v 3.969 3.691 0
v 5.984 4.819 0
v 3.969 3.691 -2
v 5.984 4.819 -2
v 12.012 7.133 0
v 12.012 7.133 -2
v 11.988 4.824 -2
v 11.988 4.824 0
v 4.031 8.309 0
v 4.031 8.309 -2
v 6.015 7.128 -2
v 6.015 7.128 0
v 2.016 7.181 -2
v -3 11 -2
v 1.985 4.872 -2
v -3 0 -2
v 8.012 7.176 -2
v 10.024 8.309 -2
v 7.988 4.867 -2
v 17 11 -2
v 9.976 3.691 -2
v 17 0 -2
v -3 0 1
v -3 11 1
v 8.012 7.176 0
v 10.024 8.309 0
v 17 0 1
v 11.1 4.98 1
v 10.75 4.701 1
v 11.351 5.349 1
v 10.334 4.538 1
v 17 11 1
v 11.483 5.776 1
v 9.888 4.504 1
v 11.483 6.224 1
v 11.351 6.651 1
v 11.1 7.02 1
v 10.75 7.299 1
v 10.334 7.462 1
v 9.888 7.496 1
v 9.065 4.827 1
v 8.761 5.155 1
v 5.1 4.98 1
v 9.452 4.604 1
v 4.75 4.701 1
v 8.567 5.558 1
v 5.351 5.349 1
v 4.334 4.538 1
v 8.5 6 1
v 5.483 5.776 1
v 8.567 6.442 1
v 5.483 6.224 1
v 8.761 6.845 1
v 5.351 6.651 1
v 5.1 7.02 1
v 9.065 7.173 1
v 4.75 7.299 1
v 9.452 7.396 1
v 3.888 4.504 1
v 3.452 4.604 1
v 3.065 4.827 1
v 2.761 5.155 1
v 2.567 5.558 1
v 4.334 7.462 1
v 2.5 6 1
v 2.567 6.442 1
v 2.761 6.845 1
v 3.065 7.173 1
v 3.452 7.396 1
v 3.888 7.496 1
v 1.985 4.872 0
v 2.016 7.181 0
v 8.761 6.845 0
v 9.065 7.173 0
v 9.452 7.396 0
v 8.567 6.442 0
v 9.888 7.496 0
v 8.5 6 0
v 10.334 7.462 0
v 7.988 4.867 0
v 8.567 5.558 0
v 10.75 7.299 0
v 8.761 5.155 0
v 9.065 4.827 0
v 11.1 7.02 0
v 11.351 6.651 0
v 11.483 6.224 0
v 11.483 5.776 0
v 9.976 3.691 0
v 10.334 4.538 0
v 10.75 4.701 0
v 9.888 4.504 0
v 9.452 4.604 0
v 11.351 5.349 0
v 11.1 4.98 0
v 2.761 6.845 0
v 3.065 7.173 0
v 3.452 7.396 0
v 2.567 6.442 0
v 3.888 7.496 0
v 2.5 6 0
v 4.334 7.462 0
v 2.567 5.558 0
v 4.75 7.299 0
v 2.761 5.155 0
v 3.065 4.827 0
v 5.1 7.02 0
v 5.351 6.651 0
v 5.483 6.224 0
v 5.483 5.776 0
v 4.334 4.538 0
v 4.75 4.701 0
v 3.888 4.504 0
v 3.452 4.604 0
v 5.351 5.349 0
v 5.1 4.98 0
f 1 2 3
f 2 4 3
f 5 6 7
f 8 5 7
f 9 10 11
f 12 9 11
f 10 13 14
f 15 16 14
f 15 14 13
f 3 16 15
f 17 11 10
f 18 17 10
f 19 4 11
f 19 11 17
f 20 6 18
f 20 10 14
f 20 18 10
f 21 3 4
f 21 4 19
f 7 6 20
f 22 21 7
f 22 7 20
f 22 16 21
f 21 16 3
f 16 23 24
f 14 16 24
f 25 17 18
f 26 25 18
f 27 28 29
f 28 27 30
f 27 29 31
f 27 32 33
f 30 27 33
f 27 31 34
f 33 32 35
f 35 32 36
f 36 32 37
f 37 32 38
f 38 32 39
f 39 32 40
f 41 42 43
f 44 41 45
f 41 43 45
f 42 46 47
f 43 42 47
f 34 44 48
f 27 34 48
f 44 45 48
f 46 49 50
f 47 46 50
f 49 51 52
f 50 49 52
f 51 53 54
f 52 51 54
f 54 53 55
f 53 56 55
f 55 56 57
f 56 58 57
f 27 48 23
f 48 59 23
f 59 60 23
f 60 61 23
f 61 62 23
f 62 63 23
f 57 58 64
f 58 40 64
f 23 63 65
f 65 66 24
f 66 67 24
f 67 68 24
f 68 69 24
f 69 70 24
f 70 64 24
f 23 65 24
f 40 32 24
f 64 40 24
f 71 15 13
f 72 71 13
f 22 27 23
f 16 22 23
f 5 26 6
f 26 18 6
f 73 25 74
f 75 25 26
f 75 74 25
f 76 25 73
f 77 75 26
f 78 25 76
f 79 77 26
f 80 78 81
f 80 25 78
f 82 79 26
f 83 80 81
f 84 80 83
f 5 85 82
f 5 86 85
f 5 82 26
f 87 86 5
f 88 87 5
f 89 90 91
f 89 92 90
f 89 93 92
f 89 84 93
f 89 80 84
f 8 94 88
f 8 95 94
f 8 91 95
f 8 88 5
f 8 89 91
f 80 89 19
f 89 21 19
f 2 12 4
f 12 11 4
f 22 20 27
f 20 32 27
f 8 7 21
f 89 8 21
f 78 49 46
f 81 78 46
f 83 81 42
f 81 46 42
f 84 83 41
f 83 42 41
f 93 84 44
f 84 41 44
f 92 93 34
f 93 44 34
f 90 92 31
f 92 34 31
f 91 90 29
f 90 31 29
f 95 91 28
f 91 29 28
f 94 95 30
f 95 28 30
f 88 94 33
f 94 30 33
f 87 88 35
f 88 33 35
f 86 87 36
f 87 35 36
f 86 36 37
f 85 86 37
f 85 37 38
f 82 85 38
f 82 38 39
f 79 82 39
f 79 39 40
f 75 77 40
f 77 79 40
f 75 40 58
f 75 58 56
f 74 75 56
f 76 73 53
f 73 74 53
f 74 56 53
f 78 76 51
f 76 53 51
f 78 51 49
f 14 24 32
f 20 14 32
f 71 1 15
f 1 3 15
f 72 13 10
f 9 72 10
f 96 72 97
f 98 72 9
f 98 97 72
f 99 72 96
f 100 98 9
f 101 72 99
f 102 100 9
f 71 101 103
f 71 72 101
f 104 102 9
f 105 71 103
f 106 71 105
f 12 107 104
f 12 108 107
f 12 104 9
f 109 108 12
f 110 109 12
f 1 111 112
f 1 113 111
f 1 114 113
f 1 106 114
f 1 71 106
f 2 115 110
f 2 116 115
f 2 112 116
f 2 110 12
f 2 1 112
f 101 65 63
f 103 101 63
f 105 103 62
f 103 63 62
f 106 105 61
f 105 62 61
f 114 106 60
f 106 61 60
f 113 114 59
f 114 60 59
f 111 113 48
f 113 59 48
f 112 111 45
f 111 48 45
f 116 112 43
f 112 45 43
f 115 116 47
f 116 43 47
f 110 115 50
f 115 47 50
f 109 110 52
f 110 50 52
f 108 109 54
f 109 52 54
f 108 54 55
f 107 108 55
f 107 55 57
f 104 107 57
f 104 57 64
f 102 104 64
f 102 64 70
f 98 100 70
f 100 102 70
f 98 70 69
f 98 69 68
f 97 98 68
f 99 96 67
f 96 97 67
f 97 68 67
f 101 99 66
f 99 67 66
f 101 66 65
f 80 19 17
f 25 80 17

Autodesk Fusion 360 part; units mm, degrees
sketch "Sketch1" plane through (0, 0, 0) normal (0, 0, 1) x (1, 0, 0)
  line L0 (0, 0) -> (14, 0)
  line L1 (14, 0) -> (14, 11)
  line L2 (14, 11) -> (0, 11)
  line L3 (0, 11) -> (0, 0)
  dimension "d1" = 14
  dimension "d2" = 11
extrude "Extrude1" add sketch "Sketch1" along normal blind 2
sketch "Sketch2" plane through (0, 0, 0) normal (0, -1, 0) x (1, 0, 0)
  line L0 (0, 0) -> (14, 0)
  line L1 (14, 0) -> (14, 2)
  line L2 (14, 2) -> (0, 2)
  line L3 (0, 2) -> (0, 0)
sketch "Sketch3" plane through (0, 0, 2) normal (0, 0, 1) x (-1, 0, 0)
  line L0 (0, -11) -> (0, 0)
  line L1 (0, 0) -> (-14, 0)
  line L2 (-14, 0) -> (-14, -11)
  line L3 (-14, -11) -> (0, -11)
  line L4 (0, -11) -> (3, -11)
  line L5 (3, -11) -> (3, 0)
  line L6 (3, 0) -> (0, 0)
  line L7 (0, 0) -> (0, -11)
  line L8 (-14, -11) -> (-17, -11)
  line L9 (-17, -11) -> (-17, 0)
  line L10 (-17, 0) -> (-14, 0)
  line L11 (-14, 0) -> (-14, -11)
  dimension "d26" = 3
  dimension "d27" = 3
extrude "Extrude2" add sketch "Sketch3" along normal blind 7 and the other way blind 2 contours L0 L4 L5 L6 L7 | L2 L8 L9 L10 L11
sketch "Sketch4" plane through (0, 0, 0) normal (0, 0, -1) x (1, 0, 0)
  line L0 (-3, -11) -> (17, -11)
  line L1 (17, -11) -> (17, 0)
  line L2 (17, 0) -> (-3, 0)
  line L3 (-3, 0) -> (-3, -11)
  line L4 (-3, 0) -> (17, 0)
  line L5 (17, 0) -> (17, -11)
  line L6 (17, -11) -> (-3, -11)
  line L7 (-3, -11) -> (-3, 0)
extrude "Extrude3" add sketch "Sketch4" along normal blind 2
sketch "Sketch5" plane through (0, 0, 2) normal (0, 0, 1) x (-1, 0, 0)
  line L0 (0, -11) -> (0, 0)
  line L1 (0, 0) -> (-14, 0)
  line L2 (-14, 0) -> (-14, -11)
  line L3 (-14, -11) -> (0, -11)
  line L4 (-7, -11) -> (-7, -6)
  line L5 (-7, -6) -> (0, -6)
  line L6 (-7, -6) -> (-14, -6)
  circle A0 centre (-4, -6) radius 1.5
  circle A1 centre (-10, -6) radius 1.5
  dimension "d11" = 5
  dimension "d12" = 3
  dimension "d13" = 3
  dimension "d31" = 6
  dimension "d32" = 4
extrude "Extrude4" cut sketch "Sketch5" against normal blind 4 contours L5 A0 | L5 A0 | L6 A1 | L6 A1
sketch "Sketch7" plane through (0, 0, -2) normal (0, 0, -1) x (1, 0, 0)
  circle A0 centre (4, -6) radius 1.5
  circle A1 centre (10, -6) radius 1.5
  line L0 (-3, -11) -> (17, -11)
  line L1 (17, -11) -> (17, 0)
  line L2 (17, 0) -> (-3, 0)
  line L3 (-3, 0) -> (-3, -11)
  line L4 (11.9876, -4.8242) -> (9.9755, -3.6907)
  line L5 (9.9755, -3.6907) -> (7.9879, -4.8666)
  line L6 (7.9879, -4.8666) -> (8.0124, -7.1758)
  line L7 (8.0124, -7.1758) -> (10.0245, -8.3093)
  line L8 (10.0245, -8.3093) -> (12.0121, -7.1334)
  line L9 (12.0121, -7.1334) -> (11.9876, -4.8242)
  line L10 (2.0156, -7.1814) -> (4.0309, -8.3092)
  line L11 (4.0309, -8.3092) -> (6.0153, -7.1278)
  line L12 (6.0153, -7.1278) -> (5.9844, -4.8186)
  line L13 (5.9844, -4.8186) -> (3.9691, -3.6908)
  line L14 (3.9691, -3.6908) -> (1.9847, -4.8722)
  line L15 (1.9847, -4.8722) -> (2.0156, -7.1814)
  point P0 (10, -6)
  point P1 (4, -6)
  dimension "d22" = 2
  dimension "d23" = 2
extrude "Extrude6" cut sketch "Sketch7" against normal blind 2 contours L4 L5 L6 L7 L8 L9 | L10 L11 L12 L13 L14 L15
fillet "Fillet1" radius 1 4 edges at (-3, 5.5, 9) (0, 5.5, 9) (14, 5.5, 9) (17, 5.5, 9)
sketch "Sketch8" plane through (0, 11, 0) normal (0, 1, 0) x (-1, 0, 0)
  arc A0 (-16, 9) -> (-17, 8) centre (-16, 8) ccw
  line L0 (-17, 8) -> (-17, -2)
  line L1 (-17, -2) -> (3, -2)
  line L2 (3, -2) -> (3, 8)
  arc A1 (3, 8) -> (2, 9) centre (2, 8) ccw
  line L3 (2, 9) -> (1, 9)
  arc A2 (1, 9) -> (0, 8) centre (1, 8) ccw
  line L4 (0, 8) -> (0, 2)
  line L5 (0, 2) -> (-14, 2)
  line L6 (-14, 2) -> (-14, 8)
  arc A3 (-14, 8) -> (-15, 9) centre (-15, 8) ccw
  line L7 (-15, 9) -> (-16, 9)
  line L8 (-14, 2) -> (-17, 2)
  line L9 (-17, 2) -> (-17, 9)
  line L10 (-17, 9) -> (-14, 9)
  line L11 (-14, 9) -> (-14, 2)
  line L12 (0, 2) -> (3, 2)
  line L13 (3, 2) -> (3, 9)
  line L14 (3, 9) -> (0, 9)
  line L15 (0, 9) -> (0, 2)
extrude "Extrude7" cut sketch "Sketch8" against normal blind 4 contours A0 L0 L6 A3 L7 L8 L9 L10 L11 | L2 A1 L3 A2 L4 L12 L13 L14 L15
fillet "Fillet2" radius 2 1 edges at (7, 11, 2)
delete_face "DeleteFace1" 1 faces at (10.3333, 9.0952, 1.9977)
sketch "Sketch9" plane through (17, 0, 0) normal (1, 0, 0) x (0, 1, 0)
  line L0 (11, 2) -> (7, 2)
  line L1 (7, 2) -> (7, 8)
  line L2 (7, 8) -> (0, 8)
  line L3 (0, 8) -> (0, -2)
  line L4 (0, -2) -> (11, -2)
  line L5 (11, -2) -> (11, 2)
  line L6 (7, 2) -> (0, 2)
  line L7 (0, 2) -> (0, 9)
  line L8 (0, 9) -> (7, 9)
  line L9 (7, 9) -> (7, 2)
extrude "Extrude8" cut sketch "Sketch9" against normal blind 20 contours L1 L2 L3 L6 L7 L9 | L2 L7 L8 L9
extrude "Extrude9" cut 1 faces at (7.8887, 1.5125, 2) along direction (0, 0, -1) blind 1
